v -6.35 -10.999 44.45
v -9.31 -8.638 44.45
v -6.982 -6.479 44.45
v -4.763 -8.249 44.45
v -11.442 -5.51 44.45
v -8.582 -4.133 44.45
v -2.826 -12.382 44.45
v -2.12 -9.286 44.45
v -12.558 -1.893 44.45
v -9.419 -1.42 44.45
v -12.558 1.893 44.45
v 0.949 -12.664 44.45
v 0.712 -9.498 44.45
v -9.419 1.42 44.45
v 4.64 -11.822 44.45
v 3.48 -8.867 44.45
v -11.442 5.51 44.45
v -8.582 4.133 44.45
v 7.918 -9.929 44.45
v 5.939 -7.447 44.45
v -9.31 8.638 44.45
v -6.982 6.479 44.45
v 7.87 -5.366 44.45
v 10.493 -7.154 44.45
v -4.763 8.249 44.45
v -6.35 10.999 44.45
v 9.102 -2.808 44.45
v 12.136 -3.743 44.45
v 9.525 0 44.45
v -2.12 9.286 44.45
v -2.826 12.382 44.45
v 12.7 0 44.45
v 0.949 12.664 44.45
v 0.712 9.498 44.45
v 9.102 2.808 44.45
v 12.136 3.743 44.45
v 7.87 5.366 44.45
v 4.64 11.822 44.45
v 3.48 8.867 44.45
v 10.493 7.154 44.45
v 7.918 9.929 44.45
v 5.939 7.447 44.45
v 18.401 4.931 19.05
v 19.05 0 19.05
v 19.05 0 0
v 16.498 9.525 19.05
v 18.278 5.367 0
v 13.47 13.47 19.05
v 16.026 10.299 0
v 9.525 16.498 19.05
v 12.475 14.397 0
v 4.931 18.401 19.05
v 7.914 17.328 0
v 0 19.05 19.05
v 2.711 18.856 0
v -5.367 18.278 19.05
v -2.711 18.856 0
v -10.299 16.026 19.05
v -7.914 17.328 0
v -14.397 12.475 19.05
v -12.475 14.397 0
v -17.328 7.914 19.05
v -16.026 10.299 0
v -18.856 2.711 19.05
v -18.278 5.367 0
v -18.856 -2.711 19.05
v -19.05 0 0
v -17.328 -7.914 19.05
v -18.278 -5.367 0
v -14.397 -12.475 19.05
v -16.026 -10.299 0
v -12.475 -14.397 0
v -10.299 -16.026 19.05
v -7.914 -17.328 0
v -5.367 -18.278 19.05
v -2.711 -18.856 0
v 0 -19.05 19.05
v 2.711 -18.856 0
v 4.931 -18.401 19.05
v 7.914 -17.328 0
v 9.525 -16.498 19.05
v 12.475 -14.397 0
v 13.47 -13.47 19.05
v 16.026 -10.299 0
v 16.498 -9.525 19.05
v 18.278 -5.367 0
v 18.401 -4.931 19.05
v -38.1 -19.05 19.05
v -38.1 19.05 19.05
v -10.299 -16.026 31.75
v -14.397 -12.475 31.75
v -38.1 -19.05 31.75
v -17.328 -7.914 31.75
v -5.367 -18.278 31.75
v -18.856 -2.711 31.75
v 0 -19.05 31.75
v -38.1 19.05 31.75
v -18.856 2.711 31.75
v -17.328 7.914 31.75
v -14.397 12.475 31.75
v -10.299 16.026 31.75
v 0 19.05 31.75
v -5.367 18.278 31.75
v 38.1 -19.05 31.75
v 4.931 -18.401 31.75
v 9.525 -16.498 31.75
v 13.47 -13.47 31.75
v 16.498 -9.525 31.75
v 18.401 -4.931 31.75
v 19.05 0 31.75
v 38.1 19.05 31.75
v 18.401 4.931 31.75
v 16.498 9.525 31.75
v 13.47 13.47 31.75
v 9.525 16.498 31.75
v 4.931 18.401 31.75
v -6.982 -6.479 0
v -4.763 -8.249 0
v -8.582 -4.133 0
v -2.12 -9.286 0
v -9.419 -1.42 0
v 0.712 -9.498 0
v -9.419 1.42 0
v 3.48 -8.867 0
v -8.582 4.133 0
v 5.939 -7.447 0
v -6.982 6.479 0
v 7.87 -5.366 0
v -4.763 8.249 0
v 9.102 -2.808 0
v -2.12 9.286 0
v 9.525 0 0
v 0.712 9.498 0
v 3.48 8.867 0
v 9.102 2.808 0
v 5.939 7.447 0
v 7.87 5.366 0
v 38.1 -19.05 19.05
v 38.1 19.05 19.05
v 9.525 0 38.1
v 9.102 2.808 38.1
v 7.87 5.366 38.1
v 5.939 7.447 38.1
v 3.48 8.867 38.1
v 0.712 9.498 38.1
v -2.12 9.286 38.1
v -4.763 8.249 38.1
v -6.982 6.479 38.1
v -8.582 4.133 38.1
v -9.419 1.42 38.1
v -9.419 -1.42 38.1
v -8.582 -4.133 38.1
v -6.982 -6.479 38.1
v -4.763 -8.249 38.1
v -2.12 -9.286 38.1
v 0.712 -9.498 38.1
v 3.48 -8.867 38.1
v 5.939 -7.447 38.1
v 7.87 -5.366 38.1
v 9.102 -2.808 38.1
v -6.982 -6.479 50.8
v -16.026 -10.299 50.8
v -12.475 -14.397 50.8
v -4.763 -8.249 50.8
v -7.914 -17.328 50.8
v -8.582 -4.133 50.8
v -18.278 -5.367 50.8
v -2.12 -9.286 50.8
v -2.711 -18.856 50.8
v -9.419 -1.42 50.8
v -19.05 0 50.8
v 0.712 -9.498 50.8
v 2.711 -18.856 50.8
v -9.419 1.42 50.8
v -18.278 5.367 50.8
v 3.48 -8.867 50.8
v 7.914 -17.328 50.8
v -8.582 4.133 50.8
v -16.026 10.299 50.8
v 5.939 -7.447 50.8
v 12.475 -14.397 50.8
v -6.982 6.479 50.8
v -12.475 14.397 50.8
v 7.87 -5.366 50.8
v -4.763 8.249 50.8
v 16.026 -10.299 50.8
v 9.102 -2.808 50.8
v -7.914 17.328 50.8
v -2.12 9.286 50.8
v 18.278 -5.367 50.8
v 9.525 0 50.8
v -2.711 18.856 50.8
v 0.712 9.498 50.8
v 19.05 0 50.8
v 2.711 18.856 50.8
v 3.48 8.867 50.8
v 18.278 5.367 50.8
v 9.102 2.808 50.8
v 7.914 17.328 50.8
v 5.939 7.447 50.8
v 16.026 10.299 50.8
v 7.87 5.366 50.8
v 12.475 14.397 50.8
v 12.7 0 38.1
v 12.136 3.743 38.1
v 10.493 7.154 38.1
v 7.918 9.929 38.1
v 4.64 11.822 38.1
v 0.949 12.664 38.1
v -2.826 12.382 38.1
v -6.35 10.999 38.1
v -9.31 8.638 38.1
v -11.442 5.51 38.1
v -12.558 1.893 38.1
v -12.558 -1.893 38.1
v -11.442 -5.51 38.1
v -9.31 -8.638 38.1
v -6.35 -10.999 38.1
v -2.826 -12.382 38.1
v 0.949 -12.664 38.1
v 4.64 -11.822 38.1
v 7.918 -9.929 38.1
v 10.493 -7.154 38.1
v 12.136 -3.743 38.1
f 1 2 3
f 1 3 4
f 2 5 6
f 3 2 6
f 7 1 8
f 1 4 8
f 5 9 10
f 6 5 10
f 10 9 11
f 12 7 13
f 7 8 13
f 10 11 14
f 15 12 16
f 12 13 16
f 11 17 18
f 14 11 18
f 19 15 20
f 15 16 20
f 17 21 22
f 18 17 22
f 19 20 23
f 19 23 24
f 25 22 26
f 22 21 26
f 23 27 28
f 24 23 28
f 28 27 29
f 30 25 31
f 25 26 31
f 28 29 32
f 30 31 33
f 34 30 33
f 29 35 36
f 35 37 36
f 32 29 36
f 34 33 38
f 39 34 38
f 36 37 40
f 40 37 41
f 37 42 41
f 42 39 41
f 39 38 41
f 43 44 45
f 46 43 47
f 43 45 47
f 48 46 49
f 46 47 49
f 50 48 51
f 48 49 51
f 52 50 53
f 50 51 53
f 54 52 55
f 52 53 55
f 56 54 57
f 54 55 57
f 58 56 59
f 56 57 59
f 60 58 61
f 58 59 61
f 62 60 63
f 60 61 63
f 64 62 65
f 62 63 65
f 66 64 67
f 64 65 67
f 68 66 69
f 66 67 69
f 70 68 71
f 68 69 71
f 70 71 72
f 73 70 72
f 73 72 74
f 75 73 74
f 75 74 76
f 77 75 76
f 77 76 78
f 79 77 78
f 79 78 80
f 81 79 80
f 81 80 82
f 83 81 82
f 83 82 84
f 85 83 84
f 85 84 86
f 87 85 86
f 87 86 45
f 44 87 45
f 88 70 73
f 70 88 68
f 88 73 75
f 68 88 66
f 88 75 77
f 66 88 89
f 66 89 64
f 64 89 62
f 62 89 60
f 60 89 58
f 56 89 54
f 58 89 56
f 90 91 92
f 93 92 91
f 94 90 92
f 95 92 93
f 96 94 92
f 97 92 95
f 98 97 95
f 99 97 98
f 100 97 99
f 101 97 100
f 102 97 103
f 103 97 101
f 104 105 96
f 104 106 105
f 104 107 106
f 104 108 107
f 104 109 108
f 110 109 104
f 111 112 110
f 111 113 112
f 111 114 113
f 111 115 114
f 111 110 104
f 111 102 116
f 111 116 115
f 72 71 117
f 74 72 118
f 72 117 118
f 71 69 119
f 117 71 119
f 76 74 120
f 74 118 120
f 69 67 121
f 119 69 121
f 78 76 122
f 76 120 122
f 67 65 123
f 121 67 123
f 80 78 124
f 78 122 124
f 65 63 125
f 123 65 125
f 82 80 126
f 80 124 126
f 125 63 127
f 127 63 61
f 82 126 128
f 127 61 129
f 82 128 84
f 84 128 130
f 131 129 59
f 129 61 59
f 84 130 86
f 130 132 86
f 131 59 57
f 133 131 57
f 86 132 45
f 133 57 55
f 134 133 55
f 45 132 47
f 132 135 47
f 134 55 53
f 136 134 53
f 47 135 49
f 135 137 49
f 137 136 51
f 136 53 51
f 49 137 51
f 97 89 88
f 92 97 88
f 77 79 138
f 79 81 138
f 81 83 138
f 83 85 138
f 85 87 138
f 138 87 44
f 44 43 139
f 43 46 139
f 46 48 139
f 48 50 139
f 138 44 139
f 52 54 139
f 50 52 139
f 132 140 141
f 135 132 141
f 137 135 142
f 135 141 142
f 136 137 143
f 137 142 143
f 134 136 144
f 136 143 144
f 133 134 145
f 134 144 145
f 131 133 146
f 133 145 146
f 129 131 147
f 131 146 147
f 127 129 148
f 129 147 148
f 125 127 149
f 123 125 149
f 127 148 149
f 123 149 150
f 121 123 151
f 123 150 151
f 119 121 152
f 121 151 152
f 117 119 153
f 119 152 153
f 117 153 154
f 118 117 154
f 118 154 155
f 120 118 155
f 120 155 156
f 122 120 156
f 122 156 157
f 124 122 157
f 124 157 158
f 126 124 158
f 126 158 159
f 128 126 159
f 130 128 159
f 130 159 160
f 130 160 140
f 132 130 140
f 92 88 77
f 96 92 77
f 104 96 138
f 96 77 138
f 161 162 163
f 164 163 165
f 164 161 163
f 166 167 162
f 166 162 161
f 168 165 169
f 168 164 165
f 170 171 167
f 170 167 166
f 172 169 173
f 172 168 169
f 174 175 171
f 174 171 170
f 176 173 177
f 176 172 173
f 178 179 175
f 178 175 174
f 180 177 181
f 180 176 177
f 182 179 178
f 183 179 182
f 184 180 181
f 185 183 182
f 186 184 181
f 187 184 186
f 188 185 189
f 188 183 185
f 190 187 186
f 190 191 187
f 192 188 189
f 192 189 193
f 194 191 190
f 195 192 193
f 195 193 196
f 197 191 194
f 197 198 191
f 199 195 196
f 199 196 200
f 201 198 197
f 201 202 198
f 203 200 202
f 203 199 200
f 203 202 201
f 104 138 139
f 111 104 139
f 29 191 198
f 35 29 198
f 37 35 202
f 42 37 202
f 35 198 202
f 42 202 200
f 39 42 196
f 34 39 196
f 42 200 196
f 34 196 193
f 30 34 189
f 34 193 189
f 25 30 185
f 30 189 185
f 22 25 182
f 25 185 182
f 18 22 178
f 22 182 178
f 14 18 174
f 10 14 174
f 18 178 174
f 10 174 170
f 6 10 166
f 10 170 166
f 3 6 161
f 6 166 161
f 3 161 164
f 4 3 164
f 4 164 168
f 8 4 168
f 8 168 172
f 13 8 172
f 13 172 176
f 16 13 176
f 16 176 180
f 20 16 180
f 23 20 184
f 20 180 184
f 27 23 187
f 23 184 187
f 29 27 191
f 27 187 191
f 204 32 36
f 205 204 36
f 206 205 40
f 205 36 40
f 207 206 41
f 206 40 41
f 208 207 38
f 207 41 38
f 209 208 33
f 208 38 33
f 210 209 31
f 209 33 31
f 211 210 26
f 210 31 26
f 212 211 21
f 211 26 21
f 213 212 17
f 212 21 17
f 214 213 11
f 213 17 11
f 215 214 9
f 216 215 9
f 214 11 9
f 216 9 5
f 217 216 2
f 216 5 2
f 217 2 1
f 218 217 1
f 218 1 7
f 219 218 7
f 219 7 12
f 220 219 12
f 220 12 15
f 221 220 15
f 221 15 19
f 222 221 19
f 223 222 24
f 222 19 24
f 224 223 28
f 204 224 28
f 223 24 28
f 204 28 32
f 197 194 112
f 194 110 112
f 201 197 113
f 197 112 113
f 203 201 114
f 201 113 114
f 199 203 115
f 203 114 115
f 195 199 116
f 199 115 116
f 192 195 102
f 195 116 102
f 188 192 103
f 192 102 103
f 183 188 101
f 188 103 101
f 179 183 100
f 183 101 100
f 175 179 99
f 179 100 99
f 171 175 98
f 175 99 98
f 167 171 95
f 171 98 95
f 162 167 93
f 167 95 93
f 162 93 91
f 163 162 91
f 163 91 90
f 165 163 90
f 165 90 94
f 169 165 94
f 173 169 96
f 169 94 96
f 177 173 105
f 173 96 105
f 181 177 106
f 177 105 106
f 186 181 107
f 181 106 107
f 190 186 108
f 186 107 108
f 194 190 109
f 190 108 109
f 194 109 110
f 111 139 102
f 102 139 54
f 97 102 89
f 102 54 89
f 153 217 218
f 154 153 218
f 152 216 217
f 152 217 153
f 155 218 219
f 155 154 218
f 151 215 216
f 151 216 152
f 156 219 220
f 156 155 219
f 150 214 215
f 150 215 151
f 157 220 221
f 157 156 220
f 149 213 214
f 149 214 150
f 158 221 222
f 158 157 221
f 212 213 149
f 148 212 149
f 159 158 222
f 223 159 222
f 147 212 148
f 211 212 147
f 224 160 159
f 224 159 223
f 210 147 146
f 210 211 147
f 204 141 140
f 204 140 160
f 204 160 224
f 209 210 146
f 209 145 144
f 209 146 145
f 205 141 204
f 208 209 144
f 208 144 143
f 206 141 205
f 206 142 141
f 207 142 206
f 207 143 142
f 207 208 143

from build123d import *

# Parameters (mm, degrees)
F0_R      = 19.05
F1_DEPTH  = 19.05
F3_DEPTH  = 12.7
F4_R      = 19.05
F5_DEPTH  = 6.35
F6_R      = 9.525
F7_DEPTH  = 57.15
F8_R      = 19.05
F9_DEPTH  = 6.35
F10_R     = 12.7
F11_DEPTH = 6.35
F12_R     = 19.05
F13_DEPTH = 6.35
F14_R     = 9.525
F15_DEPTH = 6.35


with BuildPart() as f1:
    # F0 (on Top) → F1 (new body)
    with BuildSketch(Plane.XY):
        Circle(F0_R)
    extrude(amount=F1_DEPTH)

    # F2 (on face) → F3 (join)
    with BuildSketch(Plane.XY.offset(19.05)):
        Polygon((38.1, 19.05), (0, 19.05), (-38.1, 19.05), (-38.1, -19.05), (0, -19.05), (38.1, -19.05), align=None)
    extrude(amount=F3_DEPTH)

    # F4 (on face) → F5 (join)
    with BuildSketch(Plane.XY.offset(31.75)):
        Circle(F4_R)
    extrude(amount=F5_DEPTH)

    # F6 (on face) → F7 (cut)
    with BuildSketch(Plane.XY.offset(38.1)):
        Circle(F6_R)
    extrude(amount=-F7_DEPTH, mode=Mode.SUBTRACT)

    # F8 (on face) → F9 (join)
    with BuildSketch(Plane.XY.offset(38.1)):
        Circle(F8_R)
    extrude(amount=F9_DEPTH)

    # F10 (on face) → F11 (cut)
    with BuildSketch(Plane.XY.offset(44.45)):
        Circle(F10_R)
    extrude(amount=-F11_DEPTH, mode=Mode.SUBTRACT)

    # F12 (on face) → F13 (join)
    with BuildSketch(Plane.XY.offset(44.45)):
        Circle(F12_R)
    extrude(amount=F13_DEPTH)

    # F14 (on face) → F15 (cut)
    with BuildSketch(Plane.XY.offset(50.8)):
        Circle(F14_R)
    extrude(amount=-F15_DEPTH, mode=Mode.SUBTRACT)


solid = f1.part
